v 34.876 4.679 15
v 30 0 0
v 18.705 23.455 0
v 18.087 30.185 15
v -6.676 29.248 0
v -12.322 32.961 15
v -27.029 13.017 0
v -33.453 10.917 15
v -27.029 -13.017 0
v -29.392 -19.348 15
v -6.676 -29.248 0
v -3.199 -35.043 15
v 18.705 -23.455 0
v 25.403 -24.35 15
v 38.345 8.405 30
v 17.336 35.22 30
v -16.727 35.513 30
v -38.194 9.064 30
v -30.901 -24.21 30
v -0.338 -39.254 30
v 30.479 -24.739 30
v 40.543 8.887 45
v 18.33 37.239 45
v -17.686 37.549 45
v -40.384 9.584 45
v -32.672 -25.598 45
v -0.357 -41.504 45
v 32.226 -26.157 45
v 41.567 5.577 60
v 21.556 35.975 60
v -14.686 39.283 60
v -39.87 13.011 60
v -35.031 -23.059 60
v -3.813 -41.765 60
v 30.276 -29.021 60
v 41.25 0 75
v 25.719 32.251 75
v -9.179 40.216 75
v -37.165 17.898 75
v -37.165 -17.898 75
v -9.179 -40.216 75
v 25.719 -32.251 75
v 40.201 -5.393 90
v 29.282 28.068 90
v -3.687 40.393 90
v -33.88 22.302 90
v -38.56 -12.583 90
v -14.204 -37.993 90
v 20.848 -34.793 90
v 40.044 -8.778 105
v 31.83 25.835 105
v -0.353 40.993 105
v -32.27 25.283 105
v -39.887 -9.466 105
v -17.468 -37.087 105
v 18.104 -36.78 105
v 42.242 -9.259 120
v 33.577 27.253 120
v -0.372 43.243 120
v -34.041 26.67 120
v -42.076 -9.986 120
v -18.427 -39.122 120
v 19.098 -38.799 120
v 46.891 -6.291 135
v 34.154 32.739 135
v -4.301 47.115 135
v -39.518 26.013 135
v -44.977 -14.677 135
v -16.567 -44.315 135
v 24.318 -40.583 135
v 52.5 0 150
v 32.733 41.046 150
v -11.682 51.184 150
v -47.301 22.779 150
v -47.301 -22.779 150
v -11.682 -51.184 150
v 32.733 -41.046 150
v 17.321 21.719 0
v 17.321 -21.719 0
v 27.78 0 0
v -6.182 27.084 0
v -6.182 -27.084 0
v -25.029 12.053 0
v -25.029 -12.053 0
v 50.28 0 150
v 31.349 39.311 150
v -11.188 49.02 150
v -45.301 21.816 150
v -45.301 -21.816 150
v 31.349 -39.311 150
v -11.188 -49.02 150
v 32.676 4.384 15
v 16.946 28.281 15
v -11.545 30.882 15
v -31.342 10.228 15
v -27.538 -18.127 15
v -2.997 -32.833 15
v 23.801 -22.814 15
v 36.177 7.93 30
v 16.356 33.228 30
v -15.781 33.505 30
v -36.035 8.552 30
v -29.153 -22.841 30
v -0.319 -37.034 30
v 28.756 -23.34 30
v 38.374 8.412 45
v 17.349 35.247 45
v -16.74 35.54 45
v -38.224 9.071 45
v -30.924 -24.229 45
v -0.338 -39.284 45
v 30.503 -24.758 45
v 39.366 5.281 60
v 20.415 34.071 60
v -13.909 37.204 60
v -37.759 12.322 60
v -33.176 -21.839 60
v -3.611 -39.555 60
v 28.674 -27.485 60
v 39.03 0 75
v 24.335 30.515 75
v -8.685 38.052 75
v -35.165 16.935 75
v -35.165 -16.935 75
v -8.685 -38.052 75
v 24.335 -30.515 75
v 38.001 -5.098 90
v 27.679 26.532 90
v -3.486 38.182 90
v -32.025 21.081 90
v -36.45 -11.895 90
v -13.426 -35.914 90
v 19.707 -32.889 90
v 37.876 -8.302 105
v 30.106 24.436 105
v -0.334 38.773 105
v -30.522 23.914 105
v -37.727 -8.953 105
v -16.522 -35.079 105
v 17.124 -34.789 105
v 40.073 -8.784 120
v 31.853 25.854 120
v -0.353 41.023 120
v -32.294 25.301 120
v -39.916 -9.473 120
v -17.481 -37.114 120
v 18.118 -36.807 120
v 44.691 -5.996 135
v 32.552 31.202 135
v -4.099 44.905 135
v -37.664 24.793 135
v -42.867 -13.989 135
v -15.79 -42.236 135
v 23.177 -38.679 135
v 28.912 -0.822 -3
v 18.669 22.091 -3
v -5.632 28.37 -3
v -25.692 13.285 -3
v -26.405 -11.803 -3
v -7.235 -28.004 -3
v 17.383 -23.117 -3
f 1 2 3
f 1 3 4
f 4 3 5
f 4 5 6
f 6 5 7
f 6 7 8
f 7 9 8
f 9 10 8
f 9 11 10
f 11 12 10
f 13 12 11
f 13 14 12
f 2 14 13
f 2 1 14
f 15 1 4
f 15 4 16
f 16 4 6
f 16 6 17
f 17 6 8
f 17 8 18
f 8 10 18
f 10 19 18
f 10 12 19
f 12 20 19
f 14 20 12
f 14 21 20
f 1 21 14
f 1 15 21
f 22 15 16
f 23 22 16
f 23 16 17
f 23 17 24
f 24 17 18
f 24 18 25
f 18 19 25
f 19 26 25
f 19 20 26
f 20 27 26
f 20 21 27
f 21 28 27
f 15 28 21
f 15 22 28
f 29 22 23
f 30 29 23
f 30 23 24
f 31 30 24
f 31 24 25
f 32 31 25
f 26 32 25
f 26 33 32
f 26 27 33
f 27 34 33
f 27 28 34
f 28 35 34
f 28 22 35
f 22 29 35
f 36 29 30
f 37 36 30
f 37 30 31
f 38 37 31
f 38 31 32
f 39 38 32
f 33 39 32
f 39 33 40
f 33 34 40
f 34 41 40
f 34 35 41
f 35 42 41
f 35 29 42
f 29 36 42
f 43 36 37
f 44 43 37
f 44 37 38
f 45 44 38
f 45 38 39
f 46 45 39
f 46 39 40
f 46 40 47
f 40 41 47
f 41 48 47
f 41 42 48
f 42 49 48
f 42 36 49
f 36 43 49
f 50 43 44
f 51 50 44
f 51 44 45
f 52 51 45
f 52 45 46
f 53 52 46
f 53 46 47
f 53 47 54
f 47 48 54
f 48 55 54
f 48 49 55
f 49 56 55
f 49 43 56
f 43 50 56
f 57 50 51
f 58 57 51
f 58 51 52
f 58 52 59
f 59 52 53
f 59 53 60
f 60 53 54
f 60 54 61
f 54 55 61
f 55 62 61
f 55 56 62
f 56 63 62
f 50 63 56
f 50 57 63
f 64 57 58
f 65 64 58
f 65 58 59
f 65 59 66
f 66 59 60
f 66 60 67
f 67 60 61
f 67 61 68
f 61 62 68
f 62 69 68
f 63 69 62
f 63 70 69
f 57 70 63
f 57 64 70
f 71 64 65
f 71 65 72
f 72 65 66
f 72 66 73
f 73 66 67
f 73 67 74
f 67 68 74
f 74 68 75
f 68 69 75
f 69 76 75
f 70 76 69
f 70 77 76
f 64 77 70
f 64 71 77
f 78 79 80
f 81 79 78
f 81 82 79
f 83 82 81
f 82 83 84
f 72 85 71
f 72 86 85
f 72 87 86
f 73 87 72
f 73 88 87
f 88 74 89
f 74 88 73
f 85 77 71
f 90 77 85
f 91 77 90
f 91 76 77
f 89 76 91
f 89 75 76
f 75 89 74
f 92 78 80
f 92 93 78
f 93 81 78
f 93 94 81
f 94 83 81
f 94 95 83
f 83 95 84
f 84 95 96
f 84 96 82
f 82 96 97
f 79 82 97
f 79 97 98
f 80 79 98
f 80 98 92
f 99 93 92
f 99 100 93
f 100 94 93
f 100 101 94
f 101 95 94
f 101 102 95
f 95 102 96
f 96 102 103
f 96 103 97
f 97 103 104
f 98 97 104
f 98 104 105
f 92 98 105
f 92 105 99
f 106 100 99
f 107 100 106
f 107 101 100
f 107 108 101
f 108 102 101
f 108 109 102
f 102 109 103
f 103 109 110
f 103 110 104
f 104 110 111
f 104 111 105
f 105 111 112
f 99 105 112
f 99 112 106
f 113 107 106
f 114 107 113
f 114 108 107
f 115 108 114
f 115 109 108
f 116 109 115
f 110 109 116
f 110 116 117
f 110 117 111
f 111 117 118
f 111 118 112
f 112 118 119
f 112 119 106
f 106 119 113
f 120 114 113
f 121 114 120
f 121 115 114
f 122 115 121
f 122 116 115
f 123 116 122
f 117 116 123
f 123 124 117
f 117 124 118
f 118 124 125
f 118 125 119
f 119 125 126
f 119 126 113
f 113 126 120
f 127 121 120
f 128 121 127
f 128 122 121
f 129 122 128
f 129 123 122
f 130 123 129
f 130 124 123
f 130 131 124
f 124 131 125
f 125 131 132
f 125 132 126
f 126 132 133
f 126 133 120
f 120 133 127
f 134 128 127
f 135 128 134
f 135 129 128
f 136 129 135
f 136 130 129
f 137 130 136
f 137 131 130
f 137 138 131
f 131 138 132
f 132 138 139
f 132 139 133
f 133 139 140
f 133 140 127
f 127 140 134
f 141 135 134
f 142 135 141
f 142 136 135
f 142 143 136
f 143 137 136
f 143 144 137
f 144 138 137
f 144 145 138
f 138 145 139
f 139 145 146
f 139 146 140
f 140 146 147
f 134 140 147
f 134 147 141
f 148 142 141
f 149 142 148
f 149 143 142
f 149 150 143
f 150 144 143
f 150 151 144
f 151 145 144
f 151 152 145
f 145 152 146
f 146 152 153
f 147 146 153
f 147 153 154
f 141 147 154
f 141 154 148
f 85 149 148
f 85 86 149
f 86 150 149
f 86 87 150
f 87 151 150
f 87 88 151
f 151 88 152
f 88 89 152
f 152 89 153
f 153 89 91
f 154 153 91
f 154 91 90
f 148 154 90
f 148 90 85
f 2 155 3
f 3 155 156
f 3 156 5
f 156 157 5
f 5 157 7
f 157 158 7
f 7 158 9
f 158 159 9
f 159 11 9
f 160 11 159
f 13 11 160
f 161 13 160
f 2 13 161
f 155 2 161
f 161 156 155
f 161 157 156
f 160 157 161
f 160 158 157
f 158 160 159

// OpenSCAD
//number of sides (theta resolution)
sides = 7;
//total height
total_height = 150;
//maximum radius, center to outer vertex
m_radius = 30;
//thickness (at thickest part)
thickness = 2;
// number of levels (z resolution)
nlevel = 10;
//base thickness, if 0 there is no base.
bthick = 3;
//spacing of Z levels
z_spacing = total_height/nlevel;

//linear phase angle change, determines linear twistiness (degrees/unitlength)
phasediff = 0;
//period of angular wavyness alongz (unitlength), do not make 0
period = 150;
//amplitude of wavyness of phase (degrees), make 0 if you dont want sine component
amplitude = 13;


//slope of vase radius, positive tapers out negative tapers in, 0 is straight (change in radius/change in height) 
rslope = .15;
//amplitude of profile wavyness (unitslength)
ramplitude = 5;
//frequency of profile wavyness (1/units length) 
rfrequency = 0.006666667; 

//phase along z -axis
function PAZ(z,am,pe,lin) = am*sin(z*(360/pe)) +z*lin;

//radius along z - axis
function RAZ(r,z,am,fe,lin) = r + am*sin(z*(360*fe)) + z*lin;

module makepolyhelix(level,side,spacing,radius,phase,amp,per,rphas,ramp,rfeq){// level = # of levels, side = number of sides of polygon, spacing = length between levels, radius = distance from center to vertex of polygon, phase = number of degrees the polygon is rotated on every level, amp is the amplitude of a sin() component, per is the period of that sin component
    points = [for (i = [0:level]) for (j = [0:(side -1)]) 
        [RAZ(radius,i*spacing,ramp,rfeq,rphas)*cos(PAZ(i*spacing,amp,per,phase)+j*(360/side)),
         RAZ(radius,i*spacing,ramp,rfeq,rphas)*sin(PAZ(i*spacing,amp,per,phase)+ j*(360/side)),
         i*spacing] ];
    //generate two triangular faces for each generation of nested for loop, not sure how to make this more readable
    faces = [for (i = [0:(level-1)]) for (j = [0:(side -1)]) each 
        [ [j+(i*side), j+side*(i+1), (j+1)%side+i*side],
        [(j+1)%side+(i*side), j+side*(i+1), ((j+1)%side)+(i+1)*side]]];
    
    bottomface = [for (i = [0:side-1]) i];
    topface = [for (i = [1:side]) side*(level+1)-i];
    
    faces2 = concat(faces,[bottomface],[topface]);
    
    polyhedron(points,faces2);
}

i_radius = m_radius - thickness/cos((360/sides)/2);// calculates inner radius from thickness and outer radius.
            
difference(){
    makepolyhelix(nlevel,sides,z_spacing,m_radius,phasediff,amplitude,period,rslope,ramplitude,rfrequency);
    makepolyhelix(nlevel,sides,z_spacing,i_radius,phasediff,amplitude,period,rslope,ramplitude,rfrequency);
}
if (bthick > 0){
mirror([0,0,1]){makepolyhelix(1,sides,bthick,m_radius,-phasediff,-amplitude,period,-rslope,-ramplitude,rfrequency);}
}
